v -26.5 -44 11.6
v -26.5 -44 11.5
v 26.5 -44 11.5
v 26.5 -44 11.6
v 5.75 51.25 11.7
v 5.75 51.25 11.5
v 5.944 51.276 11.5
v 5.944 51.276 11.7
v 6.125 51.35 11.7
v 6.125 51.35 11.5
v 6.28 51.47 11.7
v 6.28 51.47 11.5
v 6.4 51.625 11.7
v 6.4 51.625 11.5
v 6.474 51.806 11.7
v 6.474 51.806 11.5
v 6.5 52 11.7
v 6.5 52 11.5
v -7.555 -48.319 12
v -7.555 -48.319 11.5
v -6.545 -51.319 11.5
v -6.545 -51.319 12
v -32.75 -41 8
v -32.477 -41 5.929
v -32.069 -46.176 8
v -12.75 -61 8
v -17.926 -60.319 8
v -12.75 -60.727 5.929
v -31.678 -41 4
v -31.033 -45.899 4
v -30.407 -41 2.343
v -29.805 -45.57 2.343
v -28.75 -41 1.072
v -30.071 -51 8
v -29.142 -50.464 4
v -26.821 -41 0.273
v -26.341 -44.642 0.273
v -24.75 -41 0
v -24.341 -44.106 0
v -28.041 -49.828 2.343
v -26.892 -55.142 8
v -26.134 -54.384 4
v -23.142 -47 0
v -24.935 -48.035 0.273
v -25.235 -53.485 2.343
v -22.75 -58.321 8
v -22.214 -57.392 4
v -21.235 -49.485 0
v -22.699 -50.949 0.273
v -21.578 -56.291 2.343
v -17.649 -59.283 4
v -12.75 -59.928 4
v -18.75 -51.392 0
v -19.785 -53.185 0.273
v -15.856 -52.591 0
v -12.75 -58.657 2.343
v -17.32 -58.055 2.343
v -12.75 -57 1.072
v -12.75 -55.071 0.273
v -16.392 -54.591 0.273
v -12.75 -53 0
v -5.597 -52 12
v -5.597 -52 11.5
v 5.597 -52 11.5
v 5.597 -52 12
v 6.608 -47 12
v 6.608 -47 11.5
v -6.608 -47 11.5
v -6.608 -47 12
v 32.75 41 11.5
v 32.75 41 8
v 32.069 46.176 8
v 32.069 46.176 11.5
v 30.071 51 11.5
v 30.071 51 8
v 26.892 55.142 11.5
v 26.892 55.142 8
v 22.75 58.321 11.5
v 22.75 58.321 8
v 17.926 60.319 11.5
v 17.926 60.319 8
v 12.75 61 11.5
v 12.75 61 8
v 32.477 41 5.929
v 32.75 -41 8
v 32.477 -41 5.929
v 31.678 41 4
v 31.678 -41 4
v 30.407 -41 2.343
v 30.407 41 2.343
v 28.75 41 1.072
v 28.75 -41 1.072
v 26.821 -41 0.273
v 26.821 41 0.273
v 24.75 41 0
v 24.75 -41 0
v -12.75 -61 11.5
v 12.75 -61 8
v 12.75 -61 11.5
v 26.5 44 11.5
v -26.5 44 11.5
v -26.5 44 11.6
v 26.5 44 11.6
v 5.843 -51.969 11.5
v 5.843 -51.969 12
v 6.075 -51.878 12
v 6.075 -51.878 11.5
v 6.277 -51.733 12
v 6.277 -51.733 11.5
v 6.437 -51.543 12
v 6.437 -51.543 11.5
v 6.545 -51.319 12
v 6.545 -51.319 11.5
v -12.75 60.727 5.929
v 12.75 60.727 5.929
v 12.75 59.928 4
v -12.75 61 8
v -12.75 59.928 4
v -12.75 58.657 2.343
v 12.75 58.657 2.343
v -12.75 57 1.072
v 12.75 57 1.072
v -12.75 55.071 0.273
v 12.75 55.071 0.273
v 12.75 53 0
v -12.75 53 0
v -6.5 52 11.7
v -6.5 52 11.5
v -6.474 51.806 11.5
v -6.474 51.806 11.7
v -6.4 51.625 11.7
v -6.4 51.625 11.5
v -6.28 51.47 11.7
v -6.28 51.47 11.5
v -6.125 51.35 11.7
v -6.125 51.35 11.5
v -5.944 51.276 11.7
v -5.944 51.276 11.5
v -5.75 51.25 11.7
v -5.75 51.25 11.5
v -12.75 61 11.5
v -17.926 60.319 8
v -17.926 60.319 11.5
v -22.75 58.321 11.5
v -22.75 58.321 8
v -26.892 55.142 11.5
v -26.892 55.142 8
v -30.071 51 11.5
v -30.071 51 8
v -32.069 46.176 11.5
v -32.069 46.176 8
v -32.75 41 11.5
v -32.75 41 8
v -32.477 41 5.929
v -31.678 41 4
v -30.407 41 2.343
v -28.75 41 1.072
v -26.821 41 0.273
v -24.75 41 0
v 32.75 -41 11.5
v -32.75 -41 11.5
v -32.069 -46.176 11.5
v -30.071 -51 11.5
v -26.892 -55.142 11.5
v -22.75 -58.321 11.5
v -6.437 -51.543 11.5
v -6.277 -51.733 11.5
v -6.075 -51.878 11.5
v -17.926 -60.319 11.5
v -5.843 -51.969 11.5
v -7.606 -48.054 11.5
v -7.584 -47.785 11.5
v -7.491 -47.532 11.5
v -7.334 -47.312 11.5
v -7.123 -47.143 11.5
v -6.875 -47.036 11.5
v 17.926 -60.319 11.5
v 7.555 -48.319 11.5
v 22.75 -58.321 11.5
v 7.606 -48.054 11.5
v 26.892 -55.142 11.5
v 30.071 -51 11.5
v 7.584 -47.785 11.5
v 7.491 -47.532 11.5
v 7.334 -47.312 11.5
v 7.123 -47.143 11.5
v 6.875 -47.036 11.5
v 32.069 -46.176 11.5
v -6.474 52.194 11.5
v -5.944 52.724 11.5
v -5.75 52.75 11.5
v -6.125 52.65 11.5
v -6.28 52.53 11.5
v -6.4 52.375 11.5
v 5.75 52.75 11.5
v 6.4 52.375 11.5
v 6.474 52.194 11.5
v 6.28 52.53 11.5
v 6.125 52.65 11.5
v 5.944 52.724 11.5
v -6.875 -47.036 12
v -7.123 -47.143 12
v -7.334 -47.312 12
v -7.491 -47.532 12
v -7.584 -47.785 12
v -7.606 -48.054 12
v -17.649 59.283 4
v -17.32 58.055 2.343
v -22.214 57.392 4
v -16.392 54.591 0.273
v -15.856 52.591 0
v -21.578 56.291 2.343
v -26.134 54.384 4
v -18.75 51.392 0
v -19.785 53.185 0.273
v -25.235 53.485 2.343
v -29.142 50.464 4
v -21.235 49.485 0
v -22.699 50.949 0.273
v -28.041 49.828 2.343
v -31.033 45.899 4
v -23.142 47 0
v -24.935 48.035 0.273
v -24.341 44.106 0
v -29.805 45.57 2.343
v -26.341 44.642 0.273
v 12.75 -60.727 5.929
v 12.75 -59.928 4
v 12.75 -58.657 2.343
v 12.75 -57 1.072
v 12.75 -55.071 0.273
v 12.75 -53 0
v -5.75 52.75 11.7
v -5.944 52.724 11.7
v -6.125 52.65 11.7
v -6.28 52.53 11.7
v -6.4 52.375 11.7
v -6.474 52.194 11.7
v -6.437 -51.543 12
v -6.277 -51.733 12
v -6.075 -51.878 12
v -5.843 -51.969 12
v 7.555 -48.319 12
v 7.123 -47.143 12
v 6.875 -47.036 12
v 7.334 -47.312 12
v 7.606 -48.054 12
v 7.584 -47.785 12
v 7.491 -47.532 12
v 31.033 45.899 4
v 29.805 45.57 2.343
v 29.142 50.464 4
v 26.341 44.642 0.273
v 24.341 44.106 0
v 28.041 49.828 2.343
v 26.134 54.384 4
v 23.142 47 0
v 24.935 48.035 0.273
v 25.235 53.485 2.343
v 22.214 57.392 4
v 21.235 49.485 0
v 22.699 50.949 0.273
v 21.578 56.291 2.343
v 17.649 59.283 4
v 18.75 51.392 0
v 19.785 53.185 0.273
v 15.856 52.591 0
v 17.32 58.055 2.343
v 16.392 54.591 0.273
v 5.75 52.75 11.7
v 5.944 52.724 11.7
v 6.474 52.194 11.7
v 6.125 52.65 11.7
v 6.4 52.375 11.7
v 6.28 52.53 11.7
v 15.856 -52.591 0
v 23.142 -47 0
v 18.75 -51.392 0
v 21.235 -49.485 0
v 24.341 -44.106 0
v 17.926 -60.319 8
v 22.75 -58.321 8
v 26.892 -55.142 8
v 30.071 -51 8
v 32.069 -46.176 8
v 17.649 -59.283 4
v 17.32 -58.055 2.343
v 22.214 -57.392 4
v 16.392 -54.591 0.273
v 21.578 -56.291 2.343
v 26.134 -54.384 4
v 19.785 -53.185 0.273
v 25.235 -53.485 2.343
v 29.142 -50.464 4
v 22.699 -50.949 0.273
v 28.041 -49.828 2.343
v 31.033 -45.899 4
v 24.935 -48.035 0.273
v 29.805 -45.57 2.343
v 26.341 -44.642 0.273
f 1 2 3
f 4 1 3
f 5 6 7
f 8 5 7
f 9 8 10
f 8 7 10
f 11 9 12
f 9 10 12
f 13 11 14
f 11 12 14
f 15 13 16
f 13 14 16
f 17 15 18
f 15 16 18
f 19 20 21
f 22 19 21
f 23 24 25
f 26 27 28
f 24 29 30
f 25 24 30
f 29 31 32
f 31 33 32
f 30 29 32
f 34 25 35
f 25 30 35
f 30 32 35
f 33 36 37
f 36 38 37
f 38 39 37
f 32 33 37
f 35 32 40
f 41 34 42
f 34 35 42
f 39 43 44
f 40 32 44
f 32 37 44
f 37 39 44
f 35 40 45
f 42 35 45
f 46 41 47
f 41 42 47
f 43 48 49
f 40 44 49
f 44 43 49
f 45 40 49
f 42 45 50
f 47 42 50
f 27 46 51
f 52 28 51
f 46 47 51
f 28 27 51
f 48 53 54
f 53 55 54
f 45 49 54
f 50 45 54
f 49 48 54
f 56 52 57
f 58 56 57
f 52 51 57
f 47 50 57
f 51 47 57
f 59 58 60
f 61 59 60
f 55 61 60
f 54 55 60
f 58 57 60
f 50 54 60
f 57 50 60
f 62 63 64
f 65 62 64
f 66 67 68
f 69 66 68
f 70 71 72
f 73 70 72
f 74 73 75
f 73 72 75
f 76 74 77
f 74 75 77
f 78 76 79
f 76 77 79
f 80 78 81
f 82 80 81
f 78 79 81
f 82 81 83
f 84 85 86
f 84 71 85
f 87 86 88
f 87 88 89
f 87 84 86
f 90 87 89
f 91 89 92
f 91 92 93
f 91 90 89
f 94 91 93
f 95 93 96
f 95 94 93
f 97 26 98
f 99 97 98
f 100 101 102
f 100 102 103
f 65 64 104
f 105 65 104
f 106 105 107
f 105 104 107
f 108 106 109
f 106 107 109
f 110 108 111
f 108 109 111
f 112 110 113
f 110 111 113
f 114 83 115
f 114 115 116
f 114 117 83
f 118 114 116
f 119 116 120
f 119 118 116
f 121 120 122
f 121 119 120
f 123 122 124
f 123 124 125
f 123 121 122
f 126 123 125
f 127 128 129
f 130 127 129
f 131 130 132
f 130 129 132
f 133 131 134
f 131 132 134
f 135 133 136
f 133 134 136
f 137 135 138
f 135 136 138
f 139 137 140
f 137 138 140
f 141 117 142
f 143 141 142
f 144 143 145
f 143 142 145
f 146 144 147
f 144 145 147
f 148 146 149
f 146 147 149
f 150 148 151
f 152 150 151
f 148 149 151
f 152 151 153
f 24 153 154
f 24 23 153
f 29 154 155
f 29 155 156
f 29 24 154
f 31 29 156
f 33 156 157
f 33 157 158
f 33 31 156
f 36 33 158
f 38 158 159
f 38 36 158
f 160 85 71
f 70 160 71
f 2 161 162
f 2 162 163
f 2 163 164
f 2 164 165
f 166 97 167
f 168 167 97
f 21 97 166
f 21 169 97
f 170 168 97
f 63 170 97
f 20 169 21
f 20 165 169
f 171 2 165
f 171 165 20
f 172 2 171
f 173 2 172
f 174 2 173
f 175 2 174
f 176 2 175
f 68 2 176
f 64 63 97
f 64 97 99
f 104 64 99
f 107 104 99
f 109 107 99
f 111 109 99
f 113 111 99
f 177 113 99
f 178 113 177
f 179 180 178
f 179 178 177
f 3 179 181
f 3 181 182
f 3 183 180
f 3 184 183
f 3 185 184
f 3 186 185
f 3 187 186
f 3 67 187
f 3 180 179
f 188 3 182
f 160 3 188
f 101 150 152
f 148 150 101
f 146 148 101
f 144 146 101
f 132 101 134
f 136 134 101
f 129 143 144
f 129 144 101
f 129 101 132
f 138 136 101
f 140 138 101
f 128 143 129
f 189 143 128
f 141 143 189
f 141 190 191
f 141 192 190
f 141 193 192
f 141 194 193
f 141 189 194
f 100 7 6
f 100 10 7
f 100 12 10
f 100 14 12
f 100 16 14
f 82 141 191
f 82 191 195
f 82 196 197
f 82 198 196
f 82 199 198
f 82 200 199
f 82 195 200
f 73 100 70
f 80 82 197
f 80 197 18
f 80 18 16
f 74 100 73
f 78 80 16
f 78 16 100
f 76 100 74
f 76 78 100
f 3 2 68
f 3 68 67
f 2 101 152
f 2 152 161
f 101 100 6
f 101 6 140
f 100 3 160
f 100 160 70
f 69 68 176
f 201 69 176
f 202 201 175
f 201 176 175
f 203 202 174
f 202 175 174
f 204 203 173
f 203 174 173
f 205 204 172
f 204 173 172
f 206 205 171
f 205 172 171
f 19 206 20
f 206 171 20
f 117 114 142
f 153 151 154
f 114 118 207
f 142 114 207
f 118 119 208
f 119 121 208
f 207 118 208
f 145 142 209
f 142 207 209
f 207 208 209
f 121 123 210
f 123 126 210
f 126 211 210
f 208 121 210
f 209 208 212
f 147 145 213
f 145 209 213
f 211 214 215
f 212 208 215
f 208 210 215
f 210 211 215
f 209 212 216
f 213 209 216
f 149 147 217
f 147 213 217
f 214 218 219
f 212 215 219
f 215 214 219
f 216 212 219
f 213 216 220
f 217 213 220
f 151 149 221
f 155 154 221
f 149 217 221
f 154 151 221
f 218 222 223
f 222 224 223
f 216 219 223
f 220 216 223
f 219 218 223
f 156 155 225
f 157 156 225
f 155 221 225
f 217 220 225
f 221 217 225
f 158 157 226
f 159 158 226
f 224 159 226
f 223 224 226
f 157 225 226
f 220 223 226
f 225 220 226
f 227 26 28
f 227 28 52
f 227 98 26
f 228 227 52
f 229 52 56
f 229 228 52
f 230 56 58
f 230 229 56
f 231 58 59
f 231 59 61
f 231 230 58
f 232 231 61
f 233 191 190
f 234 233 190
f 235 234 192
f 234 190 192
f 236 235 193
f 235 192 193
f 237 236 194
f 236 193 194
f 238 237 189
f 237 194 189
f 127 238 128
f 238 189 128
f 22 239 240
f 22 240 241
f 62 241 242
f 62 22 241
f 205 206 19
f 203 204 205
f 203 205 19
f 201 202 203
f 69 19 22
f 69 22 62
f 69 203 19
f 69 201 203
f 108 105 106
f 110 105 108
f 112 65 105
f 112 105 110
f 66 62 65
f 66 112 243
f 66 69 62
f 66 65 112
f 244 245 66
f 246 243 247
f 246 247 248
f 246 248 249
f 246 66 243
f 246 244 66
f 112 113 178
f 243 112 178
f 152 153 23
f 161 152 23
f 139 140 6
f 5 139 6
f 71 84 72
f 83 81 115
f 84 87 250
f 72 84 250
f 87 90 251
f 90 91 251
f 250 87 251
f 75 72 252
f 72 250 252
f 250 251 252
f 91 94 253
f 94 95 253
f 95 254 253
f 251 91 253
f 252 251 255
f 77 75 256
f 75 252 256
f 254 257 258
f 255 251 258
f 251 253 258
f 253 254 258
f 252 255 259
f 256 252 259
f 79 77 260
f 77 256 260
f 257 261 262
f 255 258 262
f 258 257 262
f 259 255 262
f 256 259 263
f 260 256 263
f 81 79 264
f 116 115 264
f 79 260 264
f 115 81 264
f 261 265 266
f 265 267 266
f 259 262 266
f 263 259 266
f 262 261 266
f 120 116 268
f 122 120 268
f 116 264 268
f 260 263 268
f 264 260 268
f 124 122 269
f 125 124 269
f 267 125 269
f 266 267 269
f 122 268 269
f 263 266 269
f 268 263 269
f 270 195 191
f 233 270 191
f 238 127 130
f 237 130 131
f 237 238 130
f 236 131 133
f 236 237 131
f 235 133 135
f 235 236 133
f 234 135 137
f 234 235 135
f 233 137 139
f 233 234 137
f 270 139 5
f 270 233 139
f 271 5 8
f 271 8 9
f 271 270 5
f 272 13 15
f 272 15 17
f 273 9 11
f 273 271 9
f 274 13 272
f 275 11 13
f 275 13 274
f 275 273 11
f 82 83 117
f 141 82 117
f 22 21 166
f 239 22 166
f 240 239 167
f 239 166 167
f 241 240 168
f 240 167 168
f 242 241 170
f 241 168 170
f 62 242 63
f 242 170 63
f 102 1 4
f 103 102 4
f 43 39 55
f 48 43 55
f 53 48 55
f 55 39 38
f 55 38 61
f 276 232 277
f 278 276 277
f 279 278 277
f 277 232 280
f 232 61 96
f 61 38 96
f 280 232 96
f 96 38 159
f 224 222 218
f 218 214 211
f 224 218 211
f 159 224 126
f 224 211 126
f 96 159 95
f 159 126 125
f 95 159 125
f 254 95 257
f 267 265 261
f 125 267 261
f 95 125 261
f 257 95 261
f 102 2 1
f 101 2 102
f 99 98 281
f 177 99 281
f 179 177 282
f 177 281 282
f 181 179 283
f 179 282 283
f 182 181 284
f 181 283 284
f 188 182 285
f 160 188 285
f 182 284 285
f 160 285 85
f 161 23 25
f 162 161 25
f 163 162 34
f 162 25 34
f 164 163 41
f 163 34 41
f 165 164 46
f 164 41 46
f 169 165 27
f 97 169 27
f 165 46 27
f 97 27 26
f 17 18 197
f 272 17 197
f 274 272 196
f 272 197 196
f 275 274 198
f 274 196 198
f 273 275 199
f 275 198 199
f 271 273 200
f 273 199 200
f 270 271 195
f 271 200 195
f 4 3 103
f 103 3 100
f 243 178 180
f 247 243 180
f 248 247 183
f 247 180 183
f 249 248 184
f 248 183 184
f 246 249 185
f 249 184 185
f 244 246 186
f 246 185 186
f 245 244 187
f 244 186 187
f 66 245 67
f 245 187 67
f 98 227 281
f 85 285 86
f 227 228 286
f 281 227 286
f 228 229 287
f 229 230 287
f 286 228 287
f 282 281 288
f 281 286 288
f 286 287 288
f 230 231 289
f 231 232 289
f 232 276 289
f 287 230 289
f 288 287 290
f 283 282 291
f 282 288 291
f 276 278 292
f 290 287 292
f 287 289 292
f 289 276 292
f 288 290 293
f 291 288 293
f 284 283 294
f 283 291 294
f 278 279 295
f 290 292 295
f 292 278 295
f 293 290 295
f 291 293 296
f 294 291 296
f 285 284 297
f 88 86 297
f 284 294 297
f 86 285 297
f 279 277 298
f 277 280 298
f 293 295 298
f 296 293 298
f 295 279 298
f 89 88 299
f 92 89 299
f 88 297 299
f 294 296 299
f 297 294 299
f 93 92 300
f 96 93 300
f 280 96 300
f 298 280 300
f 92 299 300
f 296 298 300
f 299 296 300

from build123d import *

# Parameters (mm, degrees)
F1_DEPTH = 11.5
F2_R     = 8
F4_DEPTH = 0.5
F5_W     = 53
F5_H     = 88
F6_DEPTH = 0.1
F8_DEPTH = 0.2


with BuildPart() as f1:
    # F0 (on Top) → F1 (new body)
    with BuildSketch(Plane.XY):
        with BuildLine():
            ThreePointArc((32.75, 41), (26.892136, 55.142136), (12.75, 61))
            Line((12.75, 61), (-12.75, 61))
            ThreePointArc((-12.75, 61), (-26.892136, 55.142136), (-32.75, 41))
            Line((-32.75, 41), (-32.75, -41))
            ThreePointArc((-32.75, -41), (-26.892136, -55.142136), (-12.75, -61))
            Line((-12.75, -61), (12.75, -61))
            ThreePointArc((12.75, -61), (26.892136, -55.142136), (32.75, -41))
            Line((32.75, -41), (32.75, 41))
        make_face()
    extrude(amount=F1_DEPTH)

    # F2
    f2_edges = [f1.edges().sort_by_distance(p)[0] for p in [
        (-26.892136, 55.142136, 0),
    ]]
    fillet(f2_edges, radius=F2_R)

    # F3 (on face) → F4 (join)
    with BuildSketch(Plane.XY.offset(11.5)):
        with BuildLine():
            Line((0, -47), (-6.607793, -47))
            ThreePointArc((-6.607793, -47), (-7.419988, -47.416614), (-7.55544, -48.31932))
            Line((-7.55544, -48.31932), (-6.544556, -51.31932))
            ThreePointArc((-6.544556, -51.31932), (-6.180295, -51.812195), (-5.596909, -52))
            Line((-5.596909, -52), (0, -52))
            Line((0, -52), (5.596909, -52))
            ThreePointArc((5.596909, -52), (6.180295, -51.812195), (6.544556, -51.31932))
            Line((6.544556, -51.31932), (7.55544, -48.31932))
            ThreePointArc((7.55544, -48.31932), (7.419988, -47.416614), (6.607793, -47))
            Line((6.607793, -47), (0, -47))
        make_face()
    extrude(amount=F4_DEPTH)

    # F5 (on face) → F6 (join)
    with BuildSketch(Plane.XY.offset(11.5)):
        Rectangle(F5_W, F5_H)
    extrude(amount=F6_DEPTH)

    # F7 (on face) → F8 (join)
    with BuildSketch(Plane.XY.offset(11.5)):
        with BuildLine():
            Line((-5.75, 51.25), (5.75, 51.25))
            ThreePointArc((5.75, 51.25), (6.28033, 51.46967), (6.5, 52))
            ThreePointArc((6.5, 52), (6.28033, 52.53033), (5.75, 52.75))
            Line((5.75, 52.75), (-5.75, 52.75))
            ThreePointArc((-5.75, 52.75), (-6.28033, 52.53033), (-6.5, 52))
            ThreePointArc((-6.5, 52), (-6.28033, 51.46967), (-5.75, 51.25))
        make_face()
    extrude(amount=F8_DEPTH)


solid = f1.part
